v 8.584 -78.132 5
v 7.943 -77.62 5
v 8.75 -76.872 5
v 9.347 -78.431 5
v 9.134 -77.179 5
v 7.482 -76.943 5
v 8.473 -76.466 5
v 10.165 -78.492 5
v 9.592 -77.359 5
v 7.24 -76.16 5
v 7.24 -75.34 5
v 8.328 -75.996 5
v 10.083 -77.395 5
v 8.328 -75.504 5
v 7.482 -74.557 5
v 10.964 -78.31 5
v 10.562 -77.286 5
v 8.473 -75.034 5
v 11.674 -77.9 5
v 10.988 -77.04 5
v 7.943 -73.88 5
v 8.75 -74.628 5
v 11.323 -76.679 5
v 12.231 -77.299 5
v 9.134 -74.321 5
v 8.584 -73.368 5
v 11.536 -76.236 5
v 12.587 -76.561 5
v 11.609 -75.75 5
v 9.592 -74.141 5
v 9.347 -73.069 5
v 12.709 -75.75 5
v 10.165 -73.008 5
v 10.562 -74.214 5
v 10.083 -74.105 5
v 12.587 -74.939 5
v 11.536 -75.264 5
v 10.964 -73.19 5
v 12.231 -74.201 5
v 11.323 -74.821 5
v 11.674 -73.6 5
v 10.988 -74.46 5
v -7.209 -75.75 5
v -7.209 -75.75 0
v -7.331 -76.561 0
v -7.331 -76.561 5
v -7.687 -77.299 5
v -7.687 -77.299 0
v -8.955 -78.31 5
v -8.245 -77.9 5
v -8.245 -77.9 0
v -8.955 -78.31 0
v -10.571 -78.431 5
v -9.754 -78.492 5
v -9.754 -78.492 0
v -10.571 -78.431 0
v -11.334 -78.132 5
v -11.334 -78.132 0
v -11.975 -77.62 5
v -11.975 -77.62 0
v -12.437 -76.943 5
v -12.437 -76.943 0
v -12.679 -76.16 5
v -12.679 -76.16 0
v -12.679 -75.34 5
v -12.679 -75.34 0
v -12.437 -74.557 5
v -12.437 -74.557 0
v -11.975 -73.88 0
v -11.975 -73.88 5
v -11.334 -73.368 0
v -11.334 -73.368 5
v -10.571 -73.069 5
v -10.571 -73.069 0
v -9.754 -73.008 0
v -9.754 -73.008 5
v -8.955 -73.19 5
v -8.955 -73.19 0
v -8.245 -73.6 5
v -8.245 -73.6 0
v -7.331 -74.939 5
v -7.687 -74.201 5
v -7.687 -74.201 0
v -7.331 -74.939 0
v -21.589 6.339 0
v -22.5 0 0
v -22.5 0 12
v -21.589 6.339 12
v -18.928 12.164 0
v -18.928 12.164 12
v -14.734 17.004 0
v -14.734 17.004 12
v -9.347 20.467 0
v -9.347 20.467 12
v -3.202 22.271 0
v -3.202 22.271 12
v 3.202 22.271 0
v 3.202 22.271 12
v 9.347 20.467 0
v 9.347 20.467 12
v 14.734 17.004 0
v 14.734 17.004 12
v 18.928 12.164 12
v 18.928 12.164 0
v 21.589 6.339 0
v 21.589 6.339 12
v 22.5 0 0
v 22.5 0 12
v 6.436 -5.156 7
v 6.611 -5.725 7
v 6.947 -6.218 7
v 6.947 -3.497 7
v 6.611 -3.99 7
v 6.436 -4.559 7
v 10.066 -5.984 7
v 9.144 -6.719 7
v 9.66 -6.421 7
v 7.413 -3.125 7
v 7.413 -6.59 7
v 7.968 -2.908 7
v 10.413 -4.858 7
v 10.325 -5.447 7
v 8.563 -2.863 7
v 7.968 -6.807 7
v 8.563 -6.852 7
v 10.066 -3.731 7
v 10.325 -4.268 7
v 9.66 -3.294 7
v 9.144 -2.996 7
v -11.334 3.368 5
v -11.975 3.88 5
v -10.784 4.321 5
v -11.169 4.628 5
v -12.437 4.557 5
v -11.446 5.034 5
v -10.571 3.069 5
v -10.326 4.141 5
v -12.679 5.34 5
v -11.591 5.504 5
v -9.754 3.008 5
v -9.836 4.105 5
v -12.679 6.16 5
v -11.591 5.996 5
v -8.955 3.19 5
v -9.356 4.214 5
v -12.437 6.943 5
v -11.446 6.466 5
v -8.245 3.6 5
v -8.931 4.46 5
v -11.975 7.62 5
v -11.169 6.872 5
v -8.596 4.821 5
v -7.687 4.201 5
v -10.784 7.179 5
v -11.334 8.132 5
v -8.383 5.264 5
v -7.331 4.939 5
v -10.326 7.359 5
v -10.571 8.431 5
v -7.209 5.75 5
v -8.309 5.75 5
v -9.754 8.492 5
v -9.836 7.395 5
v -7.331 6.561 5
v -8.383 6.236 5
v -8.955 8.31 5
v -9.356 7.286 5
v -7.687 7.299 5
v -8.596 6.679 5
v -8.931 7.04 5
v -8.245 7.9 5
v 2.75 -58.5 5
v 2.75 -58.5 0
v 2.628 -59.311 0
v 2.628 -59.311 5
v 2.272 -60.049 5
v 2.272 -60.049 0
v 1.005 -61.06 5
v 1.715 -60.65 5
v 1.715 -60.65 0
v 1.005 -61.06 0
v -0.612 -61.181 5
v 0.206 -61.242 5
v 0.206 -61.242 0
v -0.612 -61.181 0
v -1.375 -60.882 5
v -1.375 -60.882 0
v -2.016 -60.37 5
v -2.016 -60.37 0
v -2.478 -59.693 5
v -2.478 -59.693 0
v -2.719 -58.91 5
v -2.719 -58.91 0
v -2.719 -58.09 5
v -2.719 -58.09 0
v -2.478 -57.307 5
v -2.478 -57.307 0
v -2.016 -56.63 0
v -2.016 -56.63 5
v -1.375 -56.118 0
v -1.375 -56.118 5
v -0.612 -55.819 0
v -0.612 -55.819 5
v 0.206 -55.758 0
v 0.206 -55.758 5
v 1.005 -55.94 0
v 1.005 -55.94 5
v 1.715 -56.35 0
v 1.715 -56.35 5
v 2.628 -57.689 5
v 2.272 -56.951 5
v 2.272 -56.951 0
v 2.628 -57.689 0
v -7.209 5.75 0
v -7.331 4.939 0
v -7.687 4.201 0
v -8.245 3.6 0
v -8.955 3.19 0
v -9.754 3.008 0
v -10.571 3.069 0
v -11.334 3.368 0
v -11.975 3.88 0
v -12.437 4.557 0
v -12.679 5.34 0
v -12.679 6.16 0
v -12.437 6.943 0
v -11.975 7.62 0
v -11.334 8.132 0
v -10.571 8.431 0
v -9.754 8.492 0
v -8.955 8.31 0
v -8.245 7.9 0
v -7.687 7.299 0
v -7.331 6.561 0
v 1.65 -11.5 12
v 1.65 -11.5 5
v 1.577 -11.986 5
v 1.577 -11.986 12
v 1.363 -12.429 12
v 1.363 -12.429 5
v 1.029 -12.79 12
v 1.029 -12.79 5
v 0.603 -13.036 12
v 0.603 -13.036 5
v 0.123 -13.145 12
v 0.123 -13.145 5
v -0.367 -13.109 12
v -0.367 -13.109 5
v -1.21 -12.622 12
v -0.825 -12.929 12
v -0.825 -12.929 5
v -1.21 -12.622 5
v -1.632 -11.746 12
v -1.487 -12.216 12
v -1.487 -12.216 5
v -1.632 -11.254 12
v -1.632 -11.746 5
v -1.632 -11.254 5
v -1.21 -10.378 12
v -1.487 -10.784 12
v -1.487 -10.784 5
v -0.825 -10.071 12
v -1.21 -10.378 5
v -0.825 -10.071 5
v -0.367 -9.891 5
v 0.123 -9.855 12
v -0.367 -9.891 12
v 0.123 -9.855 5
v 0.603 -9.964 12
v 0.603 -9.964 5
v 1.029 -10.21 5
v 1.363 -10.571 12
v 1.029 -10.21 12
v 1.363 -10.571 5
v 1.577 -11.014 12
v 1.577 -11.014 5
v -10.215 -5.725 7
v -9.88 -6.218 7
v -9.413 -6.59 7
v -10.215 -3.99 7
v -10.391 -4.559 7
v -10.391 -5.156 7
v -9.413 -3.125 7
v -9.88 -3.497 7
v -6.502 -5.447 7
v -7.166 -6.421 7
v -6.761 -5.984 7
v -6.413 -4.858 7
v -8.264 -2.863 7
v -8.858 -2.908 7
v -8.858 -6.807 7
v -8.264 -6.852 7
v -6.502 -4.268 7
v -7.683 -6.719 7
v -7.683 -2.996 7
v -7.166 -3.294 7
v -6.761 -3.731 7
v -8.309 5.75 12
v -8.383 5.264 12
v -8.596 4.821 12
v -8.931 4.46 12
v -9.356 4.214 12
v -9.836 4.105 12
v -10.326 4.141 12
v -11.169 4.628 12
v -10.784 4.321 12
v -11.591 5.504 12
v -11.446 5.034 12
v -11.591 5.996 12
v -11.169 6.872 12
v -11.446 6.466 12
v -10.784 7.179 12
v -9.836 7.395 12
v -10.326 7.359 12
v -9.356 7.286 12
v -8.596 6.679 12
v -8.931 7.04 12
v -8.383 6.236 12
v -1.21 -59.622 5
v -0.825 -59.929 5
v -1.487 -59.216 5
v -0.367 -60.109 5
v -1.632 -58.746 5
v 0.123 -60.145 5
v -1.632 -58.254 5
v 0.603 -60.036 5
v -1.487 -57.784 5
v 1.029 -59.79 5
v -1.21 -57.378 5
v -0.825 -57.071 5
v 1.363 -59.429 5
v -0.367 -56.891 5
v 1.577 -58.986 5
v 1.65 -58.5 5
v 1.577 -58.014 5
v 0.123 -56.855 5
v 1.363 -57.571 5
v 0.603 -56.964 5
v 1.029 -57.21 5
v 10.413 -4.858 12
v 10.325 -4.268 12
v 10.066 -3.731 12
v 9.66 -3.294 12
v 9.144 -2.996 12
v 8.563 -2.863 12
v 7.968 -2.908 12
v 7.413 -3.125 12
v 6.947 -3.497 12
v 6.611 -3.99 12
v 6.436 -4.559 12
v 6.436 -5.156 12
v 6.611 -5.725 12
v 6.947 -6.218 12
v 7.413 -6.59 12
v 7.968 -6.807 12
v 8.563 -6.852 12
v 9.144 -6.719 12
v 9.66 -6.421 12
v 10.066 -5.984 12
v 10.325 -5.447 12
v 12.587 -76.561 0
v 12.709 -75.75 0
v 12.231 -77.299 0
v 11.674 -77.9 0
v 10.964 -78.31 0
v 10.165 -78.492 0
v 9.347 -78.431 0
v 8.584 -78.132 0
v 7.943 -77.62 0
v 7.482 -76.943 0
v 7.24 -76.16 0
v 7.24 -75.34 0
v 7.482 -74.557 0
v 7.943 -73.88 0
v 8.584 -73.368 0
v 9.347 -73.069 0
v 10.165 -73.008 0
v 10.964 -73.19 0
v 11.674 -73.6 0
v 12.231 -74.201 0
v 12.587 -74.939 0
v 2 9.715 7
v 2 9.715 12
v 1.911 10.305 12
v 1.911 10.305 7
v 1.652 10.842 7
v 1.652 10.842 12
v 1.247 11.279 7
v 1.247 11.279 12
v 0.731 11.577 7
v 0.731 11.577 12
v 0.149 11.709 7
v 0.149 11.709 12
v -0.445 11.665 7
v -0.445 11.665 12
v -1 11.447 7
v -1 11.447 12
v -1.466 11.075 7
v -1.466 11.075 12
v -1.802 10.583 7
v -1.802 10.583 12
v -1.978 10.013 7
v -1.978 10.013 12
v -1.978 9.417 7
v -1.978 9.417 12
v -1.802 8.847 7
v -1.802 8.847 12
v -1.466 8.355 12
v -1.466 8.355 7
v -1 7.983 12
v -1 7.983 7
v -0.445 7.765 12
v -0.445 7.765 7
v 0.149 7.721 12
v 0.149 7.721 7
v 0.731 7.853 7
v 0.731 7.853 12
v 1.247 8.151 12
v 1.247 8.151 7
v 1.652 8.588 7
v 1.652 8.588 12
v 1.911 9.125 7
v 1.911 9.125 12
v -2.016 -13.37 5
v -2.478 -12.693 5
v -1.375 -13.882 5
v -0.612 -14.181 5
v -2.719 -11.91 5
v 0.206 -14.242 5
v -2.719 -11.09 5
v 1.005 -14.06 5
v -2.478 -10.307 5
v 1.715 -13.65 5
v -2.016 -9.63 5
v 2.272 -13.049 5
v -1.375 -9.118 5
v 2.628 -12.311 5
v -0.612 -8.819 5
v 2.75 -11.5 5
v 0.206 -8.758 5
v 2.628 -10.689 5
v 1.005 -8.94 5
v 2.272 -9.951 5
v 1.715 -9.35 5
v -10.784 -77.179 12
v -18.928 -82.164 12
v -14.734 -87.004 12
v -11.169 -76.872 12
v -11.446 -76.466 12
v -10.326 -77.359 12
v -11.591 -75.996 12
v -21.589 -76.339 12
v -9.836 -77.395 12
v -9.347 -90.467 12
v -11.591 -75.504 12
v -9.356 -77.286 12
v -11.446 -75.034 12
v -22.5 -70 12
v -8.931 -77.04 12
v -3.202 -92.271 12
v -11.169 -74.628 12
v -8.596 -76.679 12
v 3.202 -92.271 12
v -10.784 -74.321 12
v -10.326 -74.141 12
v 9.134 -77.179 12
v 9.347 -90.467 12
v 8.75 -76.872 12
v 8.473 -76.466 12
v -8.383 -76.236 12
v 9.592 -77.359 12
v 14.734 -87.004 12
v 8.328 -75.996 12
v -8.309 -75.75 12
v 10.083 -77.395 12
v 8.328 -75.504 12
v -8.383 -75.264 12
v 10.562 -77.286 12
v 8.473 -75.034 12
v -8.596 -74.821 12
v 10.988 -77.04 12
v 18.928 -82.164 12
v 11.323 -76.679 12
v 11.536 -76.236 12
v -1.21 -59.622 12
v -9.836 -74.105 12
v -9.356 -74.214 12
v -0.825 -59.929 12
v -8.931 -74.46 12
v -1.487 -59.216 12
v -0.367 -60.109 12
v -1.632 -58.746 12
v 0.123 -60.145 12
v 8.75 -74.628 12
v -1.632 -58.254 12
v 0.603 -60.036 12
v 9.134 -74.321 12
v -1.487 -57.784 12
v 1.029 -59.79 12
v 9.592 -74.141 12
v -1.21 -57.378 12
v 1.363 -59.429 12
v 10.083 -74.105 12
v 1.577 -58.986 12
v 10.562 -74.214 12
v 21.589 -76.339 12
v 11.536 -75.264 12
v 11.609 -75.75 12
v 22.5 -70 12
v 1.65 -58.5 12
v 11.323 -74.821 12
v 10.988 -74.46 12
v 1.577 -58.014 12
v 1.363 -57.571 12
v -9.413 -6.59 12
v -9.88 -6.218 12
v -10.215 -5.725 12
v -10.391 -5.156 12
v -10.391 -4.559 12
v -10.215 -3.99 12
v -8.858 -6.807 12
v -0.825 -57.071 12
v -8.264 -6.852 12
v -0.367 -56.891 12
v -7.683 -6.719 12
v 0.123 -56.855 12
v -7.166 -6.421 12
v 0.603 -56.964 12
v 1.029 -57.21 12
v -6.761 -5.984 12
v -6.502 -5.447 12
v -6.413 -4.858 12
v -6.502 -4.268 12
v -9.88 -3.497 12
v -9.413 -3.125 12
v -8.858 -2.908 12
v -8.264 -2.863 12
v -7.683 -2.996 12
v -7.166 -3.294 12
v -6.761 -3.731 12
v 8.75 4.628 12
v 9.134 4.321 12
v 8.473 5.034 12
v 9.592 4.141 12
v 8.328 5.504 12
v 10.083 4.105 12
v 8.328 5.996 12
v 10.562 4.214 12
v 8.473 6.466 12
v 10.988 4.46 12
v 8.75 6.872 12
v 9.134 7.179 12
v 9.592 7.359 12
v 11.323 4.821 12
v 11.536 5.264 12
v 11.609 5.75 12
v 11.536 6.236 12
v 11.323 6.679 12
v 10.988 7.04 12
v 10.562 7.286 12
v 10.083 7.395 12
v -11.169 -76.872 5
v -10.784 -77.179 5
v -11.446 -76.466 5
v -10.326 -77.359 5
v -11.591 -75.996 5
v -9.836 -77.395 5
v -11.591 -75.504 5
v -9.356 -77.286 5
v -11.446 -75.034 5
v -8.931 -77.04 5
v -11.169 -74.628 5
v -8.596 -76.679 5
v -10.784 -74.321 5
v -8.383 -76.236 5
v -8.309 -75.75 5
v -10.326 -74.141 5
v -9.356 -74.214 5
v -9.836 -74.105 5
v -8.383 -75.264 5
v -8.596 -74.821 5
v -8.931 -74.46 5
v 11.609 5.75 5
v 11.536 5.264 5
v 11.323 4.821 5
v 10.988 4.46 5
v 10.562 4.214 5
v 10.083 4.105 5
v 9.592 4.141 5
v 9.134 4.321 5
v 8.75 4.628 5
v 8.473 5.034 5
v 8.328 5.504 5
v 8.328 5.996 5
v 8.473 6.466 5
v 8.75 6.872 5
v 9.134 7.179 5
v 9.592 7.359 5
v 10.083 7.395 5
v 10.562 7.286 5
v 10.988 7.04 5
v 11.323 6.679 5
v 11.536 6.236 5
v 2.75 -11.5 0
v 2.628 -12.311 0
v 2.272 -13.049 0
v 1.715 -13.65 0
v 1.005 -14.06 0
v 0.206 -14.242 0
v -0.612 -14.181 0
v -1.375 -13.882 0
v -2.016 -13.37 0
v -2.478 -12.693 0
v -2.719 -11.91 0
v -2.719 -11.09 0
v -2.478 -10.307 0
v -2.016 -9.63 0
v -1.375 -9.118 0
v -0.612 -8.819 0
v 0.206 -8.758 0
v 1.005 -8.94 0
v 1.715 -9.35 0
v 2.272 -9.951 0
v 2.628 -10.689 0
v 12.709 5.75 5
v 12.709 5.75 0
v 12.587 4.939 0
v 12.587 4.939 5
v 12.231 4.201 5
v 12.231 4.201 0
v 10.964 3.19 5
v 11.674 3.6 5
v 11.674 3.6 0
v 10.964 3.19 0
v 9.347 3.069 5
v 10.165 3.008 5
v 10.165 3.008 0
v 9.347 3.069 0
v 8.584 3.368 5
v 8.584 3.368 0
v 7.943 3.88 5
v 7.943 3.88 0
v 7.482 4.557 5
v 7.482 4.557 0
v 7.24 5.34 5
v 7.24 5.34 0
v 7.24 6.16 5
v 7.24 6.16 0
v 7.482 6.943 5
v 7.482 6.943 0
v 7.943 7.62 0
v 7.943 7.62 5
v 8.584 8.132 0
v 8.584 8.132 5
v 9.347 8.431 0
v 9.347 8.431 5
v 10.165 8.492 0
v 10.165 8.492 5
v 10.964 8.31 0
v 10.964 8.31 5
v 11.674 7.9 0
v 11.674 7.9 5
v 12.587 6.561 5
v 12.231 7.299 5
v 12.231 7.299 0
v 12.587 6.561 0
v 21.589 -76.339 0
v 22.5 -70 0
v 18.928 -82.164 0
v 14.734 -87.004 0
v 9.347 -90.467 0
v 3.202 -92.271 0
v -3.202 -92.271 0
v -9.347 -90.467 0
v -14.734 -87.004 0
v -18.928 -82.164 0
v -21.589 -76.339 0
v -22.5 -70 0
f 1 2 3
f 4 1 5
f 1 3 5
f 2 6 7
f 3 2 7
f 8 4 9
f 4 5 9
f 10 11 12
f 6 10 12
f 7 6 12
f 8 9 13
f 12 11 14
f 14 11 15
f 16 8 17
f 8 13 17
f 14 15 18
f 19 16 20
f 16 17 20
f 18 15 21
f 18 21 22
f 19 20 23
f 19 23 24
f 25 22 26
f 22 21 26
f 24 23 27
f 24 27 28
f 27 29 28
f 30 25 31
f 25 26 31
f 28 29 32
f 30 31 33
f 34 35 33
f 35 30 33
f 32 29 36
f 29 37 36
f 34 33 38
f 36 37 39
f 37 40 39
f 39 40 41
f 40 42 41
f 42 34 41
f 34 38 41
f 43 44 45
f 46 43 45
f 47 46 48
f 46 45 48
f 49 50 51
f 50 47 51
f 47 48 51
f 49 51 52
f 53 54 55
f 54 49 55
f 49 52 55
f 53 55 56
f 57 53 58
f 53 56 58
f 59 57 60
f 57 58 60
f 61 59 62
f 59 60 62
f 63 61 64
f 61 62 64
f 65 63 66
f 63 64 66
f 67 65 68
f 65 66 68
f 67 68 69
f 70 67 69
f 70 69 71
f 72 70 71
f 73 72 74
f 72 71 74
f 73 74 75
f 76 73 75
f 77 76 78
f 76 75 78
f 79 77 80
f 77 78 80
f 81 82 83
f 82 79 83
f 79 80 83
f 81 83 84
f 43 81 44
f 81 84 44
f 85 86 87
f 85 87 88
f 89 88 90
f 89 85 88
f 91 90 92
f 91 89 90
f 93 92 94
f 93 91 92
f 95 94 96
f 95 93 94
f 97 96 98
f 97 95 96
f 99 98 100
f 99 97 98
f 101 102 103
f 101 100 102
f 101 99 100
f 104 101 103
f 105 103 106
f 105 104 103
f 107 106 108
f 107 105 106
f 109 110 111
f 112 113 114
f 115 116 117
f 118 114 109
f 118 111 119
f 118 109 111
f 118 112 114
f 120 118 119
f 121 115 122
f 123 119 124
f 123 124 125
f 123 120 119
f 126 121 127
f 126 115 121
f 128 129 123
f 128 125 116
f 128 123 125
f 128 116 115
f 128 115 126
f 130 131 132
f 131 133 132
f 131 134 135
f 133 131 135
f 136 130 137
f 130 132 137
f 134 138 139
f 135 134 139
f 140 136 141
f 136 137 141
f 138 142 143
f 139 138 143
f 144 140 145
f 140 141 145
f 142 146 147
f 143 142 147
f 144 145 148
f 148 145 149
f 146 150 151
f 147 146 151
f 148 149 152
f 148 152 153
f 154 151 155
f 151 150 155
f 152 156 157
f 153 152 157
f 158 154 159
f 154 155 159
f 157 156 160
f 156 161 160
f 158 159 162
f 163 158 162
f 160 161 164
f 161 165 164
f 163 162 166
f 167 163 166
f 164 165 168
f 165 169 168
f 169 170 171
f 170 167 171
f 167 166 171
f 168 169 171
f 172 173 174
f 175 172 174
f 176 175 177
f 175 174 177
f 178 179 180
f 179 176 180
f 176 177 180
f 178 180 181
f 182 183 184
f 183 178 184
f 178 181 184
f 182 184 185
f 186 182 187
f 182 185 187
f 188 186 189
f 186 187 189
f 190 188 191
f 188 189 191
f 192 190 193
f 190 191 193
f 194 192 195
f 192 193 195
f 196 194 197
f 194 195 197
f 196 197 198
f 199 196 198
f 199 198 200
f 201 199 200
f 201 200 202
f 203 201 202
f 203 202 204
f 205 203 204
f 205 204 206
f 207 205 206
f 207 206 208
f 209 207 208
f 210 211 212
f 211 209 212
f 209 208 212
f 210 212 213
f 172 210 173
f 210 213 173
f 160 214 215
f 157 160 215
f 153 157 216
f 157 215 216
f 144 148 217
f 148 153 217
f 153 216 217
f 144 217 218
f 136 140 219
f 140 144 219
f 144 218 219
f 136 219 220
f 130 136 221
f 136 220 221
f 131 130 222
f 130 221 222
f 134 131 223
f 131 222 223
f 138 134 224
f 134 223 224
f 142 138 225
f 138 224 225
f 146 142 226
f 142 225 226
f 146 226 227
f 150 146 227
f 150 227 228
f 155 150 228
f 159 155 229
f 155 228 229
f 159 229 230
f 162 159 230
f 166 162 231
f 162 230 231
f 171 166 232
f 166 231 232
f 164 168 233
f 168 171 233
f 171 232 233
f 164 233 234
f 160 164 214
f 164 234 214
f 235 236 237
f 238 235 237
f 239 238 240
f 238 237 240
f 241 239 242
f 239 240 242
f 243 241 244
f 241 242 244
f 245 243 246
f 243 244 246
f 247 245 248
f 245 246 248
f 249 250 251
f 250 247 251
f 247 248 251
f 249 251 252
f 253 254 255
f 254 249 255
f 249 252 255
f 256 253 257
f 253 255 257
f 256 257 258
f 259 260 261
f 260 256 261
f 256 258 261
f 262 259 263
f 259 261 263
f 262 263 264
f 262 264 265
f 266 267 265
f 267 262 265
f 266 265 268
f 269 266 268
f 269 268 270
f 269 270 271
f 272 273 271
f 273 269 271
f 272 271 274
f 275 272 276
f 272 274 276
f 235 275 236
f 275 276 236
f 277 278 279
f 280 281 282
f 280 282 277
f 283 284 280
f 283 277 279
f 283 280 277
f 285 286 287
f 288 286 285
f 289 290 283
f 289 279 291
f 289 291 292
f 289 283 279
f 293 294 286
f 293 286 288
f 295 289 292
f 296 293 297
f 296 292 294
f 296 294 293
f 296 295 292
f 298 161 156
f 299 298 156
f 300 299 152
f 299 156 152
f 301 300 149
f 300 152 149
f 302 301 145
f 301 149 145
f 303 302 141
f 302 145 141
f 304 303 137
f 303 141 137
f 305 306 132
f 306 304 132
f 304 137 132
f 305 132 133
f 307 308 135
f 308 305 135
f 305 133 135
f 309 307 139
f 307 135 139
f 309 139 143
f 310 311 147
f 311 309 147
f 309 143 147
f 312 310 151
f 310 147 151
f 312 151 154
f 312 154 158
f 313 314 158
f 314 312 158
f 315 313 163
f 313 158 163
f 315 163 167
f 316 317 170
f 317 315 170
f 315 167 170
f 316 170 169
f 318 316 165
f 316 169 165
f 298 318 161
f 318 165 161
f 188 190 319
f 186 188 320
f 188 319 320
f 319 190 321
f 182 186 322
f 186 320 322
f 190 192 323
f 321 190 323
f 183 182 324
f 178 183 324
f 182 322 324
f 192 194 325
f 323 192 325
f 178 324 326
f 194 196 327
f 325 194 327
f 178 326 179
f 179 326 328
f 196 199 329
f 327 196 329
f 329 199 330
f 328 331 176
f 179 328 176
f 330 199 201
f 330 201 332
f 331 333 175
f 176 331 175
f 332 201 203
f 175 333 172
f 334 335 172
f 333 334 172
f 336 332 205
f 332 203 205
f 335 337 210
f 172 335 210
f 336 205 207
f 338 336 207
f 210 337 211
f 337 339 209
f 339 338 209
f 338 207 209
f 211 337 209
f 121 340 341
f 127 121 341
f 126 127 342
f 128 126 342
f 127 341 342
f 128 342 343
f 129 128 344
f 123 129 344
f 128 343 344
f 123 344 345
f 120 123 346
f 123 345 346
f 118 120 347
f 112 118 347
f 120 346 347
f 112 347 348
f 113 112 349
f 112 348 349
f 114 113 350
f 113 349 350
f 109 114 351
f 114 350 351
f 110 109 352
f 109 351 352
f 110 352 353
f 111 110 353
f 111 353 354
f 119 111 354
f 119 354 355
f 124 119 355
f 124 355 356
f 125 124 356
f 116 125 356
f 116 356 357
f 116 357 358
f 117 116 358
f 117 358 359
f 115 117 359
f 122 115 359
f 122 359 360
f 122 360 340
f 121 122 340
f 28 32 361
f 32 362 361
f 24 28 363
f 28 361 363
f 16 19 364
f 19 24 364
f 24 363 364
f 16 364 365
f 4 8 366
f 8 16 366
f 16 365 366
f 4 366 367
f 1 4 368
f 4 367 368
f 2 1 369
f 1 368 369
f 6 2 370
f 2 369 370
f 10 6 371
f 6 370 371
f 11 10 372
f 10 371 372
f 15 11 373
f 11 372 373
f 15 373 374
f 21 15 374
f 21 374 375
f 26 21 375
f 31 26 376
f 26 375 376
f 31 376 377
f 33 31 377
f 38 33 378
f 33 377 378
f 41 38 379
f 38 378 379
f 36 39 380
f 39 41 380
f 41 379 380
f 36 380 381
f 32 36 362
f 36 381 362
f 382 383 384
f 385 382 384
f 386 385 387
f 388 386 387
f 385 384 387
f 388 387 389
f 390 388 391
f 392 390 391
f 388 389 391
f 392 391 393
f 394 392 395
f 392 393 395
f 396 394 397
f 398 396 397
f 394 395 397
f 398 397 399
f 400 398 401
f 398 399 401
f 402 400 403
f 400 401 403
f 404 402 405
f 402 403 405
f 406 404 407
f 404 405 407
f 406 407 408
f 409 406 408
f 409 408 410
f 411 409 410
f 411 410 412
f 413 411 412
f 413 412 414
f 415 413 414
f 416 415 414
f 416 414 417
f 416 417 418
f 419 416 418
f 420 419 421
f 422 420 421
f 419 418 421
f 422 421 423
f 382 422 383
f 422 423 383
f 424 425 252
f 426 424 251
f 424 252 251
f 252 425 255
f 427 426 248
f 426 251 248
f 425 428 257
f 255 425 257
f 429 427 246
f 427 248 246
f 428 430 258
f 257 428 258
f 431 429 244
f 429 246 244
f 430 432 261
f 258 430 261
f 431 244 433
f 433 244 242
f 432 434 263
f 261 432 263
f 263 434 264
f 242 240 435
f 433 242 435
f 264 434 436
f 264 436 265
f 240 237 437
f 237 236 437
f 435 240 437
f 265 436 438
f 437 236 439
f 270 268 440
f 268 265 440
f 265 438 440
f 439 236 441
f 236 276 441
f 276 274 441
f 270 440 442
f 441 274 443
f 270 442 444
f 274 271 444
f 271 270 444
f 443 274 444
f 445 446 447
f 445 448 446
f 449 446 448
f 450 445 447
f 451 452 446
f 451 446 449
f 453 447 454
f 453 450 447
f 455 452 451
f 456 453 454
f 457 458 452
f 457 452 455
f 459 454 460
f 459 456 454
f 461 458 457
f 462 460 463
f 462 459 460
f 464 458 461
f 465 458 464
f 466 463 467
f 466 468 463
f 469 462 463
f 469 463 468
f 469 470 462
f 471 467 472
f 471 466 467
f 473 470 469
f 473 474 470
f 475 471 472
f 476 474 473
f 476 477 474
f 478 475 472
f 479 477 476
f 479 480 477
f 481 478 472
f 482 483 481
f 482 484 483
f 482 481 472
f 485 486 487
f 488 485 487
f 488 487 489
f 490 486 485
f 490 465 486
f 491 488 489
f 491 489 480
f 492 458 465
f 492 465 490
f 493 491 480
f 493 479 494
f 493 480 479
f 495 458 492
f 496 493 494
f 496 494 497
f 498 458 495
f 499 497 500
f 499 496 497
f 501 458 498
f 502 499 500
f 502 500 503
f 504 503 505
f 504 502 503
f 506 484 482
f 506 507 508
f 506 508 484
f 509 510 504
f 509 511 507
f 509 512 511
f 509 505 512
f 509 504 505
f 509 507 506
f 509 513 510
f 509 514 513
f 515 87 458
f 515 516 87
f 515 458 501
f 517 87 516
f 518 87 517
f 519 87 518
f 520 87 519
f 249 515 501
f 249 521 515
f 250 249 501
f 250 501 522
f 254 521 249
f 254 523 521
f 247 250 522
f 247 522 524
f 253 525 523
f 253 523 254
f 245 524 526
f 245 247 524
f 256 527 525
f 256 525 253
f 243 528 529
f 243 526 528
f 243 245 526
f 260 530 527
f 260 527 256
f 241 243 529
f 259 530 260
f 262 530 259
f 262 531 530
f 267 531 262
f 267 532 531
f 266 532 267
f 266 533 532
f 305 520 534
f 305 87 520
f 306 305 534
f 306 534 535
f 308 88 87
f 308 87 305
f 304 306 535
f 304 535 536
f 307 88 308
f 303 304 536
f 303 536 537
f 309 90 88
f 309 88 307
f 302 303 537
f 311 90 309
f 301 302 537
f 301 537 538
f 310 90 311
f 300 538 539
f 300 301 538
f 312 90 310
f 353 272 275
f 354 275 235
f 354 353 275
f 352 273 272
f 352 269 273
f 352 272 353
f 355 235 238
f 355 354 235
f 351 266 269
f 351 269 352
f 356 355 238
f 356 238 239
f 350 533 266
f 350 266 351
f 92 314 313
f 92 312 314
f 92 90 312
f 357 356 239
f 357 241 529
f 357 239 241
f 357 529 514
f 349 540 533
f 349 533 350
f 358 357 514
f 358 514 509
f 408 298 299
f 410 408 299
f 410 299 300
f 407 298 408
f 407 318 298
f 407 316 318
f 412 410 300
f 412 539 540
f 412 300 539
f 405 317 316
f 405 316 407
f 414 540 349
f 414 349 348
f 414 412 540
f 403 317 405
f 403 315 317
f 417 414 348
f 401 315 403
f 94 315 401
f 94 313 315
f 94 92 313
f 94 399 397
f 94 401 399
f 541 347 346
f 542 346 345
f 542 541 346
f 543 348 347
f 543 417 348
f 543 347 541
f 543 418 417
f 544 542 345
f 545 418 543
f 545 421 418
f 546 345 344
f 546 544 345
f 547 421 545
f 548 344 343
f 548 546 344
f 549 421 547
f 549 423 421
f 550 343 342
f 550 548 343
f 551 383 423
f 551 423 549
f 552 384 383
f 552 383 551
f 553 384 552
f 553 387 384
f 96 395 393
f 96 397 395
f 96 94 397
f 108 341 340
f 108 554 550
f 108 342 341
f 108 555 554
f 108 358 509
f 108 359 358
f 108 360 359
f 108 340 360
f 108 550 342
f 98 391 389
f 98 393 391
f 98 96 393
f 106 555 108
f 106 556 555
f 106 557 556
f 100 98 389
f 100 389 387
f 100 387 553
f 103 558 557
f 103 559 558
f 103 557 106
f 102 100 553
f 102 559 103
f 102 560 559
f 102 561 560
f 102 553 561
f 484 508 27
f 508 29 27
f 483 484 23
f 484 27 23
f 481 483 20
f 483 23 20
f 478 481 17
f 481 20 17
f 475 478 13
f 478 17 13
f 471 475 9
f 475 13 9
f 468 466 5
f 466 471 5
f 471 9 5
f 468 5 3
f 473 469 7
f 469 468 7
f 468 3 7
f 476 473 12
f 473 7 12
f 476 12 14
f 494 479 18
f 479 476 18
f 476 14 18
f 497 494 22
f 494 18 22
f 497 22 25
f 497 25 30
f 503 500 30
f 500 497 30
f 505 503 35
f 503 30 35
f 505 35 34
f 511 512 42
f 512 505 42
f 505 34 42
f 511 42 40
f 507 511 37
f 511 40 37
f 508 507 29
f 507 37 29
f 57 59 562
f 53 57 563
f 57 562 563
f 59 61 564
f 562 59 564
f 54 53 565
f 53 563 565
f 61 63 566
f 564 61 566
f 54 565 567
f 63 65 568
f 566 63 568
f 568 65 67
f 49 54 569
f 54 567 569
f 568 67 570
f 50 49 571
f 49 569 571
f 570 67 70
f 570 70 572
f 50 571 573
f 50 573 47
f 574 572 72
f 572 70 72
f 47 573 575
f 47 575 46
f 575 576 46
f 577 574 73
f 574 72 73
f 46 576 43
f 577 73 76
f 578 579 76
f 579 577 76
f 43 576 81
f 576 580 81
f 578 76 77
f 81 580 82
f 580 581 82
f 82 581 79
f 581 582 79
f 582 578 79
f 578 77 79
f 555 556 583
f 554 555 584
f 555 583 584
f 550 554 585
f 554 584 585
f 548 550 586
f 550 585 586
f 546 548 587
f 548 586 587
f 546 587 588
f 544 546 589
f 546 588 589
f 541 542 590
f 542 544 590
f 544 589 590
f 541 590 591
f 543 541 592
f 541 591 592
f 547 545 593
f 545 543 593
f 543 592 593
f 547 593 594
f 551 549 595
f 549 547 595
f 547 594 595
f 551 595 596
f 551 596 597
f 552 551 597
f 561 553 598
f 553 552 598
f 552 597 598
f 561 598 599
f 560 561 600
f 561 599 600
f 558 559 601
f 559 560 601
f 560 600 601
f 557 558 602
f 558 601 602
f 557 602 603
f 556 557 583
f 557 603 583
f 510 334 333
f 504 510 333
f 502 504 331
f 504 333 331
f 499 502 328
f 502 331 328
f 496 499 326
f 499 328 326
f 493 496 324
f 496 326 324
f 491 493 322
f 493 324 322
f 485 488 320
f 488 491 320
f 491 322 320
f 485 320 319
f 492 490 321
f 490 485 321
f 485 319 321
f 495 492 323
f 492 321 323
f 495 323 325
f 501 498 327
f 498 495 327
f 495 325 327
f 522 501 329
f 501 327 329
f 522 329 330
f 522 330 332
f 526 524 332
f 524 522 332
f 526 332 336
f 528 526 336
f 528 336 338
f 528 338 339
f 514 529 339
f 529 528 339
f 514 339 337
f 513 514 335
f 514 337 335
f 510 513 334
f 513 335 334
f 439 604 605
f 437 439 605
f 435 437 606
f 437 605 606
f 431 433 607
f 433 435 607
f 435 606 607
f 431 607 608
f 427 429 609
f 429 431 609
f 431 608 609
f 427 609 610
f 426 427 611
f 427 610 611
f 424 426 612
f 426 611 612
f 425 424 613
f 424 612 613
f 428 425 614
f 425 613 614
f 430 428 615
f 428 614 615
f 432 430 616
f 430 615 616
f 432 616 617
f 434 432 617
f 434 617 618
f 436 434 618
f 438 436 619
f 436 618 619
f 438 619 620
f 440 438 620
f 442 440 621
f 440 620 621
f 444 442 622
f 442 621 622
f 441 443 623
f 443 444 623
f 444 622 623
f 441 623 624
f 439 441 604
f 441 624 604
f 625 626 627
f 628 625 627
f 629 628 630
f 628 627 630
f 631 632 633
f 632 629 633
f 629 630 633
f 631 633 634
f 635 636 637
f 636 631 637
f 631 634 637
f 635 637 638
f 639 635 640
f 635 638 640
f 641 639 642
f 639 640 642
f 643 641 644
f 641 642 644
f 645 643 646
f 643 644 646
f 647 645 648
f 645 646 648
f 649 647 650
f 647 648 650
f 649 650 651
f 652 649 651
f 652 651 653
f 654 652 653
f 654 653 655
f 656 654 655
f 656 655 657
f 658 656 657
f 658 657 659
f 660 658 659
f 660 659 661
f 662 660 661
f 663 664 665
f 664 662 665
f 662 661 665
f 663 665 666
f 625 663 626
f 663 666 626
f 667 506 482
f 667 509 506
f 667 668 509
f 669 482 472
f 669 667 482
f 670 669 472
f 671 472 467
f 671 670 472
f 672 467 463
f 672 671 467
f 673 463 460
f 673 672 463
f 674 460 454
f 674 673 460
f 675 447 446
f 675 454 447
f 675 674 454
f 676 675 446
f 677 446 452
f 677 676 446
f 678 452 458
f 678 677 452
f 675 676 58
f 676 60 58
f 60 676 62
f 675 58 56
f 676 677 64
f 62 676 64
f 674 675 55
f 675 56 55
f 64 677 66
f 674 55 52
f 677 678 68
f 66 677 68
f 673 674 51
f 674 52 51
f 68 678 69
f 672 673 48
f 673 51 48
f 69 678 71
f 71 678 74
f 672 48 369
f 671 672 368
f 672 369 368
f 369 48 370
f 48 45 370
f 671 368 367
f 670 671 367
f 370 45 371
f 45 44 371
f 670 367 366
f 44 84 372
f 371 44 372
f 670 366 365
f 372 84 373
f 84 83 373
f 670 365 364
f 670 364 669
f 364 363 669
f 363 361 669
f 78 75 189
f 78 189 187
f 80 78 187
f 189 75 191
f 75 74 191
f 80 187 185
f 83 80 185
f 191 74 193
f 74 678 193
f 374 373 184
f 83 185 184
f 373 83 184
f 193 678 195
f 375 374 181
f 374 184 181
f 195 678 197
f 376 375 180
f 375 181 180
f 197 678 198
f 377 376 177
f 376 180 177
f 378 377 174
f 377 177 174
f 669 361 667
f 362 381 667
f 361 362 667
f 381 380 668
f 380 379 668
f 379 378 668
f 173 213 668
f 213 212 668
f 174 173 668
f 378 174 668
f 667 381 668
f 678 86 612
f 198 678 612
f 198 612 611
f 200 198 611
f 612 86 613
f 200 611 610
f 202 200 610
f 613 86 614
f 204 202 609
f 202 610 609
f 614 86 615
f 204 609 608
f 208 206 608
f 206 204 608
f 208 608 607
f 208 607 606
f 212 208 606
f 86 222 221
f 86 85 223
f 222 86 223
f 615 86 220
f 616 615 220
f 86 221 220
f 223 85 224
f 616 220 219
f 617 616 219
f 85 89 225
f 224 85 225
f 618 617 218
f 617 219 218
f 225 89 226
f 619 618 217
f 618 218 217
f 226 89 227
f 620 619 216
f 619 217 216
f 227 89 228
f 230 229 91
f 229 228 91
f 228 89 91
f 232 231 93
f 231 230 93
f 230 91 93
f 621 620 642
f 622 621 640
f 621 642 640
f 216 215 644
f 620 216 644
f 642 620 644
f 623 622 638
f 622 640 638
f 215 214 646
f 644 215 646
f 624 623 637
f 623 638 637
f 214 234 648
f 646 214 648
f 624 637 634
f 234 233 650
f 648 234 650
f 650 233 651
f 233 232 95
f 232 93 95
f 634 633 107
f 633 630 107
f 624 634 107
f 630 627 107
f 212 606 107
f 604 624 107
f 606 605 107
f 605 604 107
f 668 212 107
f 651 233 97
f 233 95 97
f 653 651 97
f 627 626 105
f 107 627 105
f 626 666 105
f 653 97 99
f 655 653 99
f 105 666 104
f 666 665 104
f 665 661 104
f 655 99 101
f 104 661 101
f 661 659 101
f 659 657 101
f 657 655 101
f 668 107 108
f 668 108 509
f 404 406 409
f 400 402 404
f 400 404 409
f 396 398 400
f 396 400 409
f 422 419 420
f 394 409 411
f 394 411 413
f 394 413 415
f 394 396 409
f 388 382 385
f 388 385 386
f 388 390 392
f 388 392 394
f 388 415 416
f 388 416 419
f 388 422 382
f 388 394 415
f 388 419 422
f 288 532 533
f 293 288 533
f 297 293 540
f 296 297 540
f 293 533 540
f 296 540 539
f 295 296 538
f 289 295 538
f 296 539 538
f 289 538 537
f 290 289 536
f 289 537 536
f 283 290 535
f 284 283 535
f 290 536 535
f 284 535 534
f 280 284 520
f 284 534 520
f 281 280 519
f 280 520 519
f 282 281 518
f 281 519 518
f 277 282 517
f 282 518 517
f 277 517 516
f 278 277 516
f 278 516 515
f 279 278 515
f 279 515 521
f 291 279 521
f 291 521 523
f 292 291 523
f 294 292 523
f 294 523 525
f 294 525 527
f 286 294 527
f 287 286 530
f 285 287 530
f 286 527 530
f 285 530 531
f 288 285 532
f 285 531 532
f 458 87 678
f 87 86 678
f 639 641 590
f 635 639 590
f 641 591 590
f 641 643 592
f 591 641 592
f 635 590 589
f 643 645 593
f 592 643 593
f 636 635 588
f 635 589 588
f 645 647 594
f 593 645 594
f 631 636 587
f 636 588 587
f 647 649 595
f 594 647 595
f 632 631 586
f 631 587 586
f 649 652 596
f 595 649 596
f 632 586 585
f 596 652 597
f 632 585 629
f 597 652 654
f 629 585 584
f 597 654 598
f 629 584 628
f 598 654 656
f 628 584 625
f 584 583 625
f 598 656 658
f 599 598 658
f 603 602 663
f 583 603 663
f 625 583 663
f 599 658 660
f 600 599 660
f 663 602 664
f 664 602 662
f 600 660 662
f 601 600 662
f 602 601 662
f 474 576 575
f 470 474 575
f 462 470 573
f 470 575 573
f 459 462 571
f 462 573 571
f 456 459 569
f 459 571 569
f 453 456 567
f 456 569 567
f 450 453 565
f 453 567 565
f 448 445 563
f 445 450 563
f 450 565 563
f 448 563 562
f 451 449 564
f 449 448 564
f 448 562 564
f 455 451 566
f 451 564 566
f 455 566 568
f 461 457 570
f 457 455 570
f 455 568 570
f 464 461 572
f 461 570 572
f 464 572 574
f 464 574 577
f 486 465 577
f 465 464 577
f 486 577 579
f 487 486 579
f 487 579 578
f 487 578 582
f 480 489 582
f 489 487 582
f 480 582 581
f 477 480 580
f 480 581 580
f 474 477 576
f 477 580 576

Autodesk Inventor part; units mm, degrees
ref_plane "YZ Plane" through (0, 0, 0) normal (1, 0, 0) x (0, 1, 0)
ref_plane "XZ Plane" through (0, 0, 0) normal (0, 1, 0) x (-1, 0, 0)
ref_plane "XY Plane" through (0, 0, 0) normal (0, 0, 1) x (1, 0, 0)
sketch "Sketch1" plane through (0, 0, 0) normal (0, 0, 1) x (1, 0, 0)
  circle A0 centre (0, 0) radius 22.5
  circle A1 centre (0, -70) radius 22.5
  line L0 (-22.5, 0) -> (-22.5, -70)
  line L1 (22.5, 0) -> (22.5, -70)
  circle A2 centre (0, -70) radius 11.5 construction
  circle A3 centre (0, -70) radius 9.715 construction
  line L2 (0, -20) -> (0, -150) construction
  line L3 (11.5, -70) -> (-11.5, -70) construction
  line L4 (9.9593, -64.25) -> (0, -70) construction
  line L5 (0, -70) -> (-9.9593, -64.25) construction
  line L6 (0, -70) -> (9.9593, -75.75) construction
  line L7 (0, -70) -> (-9.9593, -75.75) construction
  circle A4 centre (0, -58.5) radius 2.75
  circle A5 centre (9.9593, -75.75) radius 2.75
  circle A6 centre (-9.9593, -75.75) radius 2.75
  circle A7 centre (0, -58.5) radius 1.65
  circle A8 centre (9.9593, -75.75) radius 1.65
  circle A9 centre (-9.9593, -75.75) radius 1.65
  circle A10 centre (8.4134, -65.1425) radius 2
  circle A11 centre (0, -79.715) radius 2
  circle A12 centre (-8.4134, -65.1425) radius 2
  line L8 (-22.5, -35) -> (22.5, -35) construction
  circle A13 centre (0, 0) radius 22.5
  line L9 (9.9593, -5.75) -> (0, 0) construction
  circle A14 centre (8.4134, -4.8575) radius 2
  line L10 (0, 0) -> (9.9593, 5.75) construction
  line L11 (0, 0) -> (-9.9593, -5.75) construction
  circle A15 centre (-8.4134, -4.8575) radius 2
  circle A16 centre (0, 0) radius 9.715 construction
  circle A17 centre (0, 0) radius 11.5 construction
  circle A18 centre (0, 9.715) radius 2
  line L12 (0, 0) -> (-9.9593, 5.75) construction
  line L13 (11.5, 0) -> (-11.5, 0) construction
  circle A19 centre (-9.9593, 5.75) radius 2.75
  circle A20 centre (-9.9593, 5.75) radius 1.65
  line L14 (0, -50) -> (0, 80) construction
  circle A21 centre (0, -11.5) radius 1.65
  circle A22 centre (0, -11.5) radius 2.75
  circle A23 centre (9.9593, 5.75) radius 2.75
  circle A24 centre (9.9593, 5.75) radius 1.65
  dimension "d3" = 23
  dimension "d0" = 45
  dimension "d1" = 70
  dimension "d2" = 19.43
  dimension "d4" = 30
  dimension "d5" = 30
  dimension "d6" = 30
  dimension "d7" = 30
  dimension "d8" = 5.5
  dimension "d9" = 3.3
  dimension "d10" = 4
extrude "Extrusion1" add sketch "Sketch1" along normal blind 12 contours A0 | L1 A1 L0 A0 | A1 | A4 | A5 | A6 | A10 | A11 | A12 | A14 | A15 | A18 | A19 | A22 | A23
extrude "Extrusion2" cut sketch "Sketch1" along normal blind 5 contours A4 | A5 | A6 | A19 | A22 | A23 | A24
extrude "Extrusion3" cut sketch "Sketch1" against normal blind 5 from surface at 12 contours A14 | A15 | A18
properties part number "shank_thigh_connector"
